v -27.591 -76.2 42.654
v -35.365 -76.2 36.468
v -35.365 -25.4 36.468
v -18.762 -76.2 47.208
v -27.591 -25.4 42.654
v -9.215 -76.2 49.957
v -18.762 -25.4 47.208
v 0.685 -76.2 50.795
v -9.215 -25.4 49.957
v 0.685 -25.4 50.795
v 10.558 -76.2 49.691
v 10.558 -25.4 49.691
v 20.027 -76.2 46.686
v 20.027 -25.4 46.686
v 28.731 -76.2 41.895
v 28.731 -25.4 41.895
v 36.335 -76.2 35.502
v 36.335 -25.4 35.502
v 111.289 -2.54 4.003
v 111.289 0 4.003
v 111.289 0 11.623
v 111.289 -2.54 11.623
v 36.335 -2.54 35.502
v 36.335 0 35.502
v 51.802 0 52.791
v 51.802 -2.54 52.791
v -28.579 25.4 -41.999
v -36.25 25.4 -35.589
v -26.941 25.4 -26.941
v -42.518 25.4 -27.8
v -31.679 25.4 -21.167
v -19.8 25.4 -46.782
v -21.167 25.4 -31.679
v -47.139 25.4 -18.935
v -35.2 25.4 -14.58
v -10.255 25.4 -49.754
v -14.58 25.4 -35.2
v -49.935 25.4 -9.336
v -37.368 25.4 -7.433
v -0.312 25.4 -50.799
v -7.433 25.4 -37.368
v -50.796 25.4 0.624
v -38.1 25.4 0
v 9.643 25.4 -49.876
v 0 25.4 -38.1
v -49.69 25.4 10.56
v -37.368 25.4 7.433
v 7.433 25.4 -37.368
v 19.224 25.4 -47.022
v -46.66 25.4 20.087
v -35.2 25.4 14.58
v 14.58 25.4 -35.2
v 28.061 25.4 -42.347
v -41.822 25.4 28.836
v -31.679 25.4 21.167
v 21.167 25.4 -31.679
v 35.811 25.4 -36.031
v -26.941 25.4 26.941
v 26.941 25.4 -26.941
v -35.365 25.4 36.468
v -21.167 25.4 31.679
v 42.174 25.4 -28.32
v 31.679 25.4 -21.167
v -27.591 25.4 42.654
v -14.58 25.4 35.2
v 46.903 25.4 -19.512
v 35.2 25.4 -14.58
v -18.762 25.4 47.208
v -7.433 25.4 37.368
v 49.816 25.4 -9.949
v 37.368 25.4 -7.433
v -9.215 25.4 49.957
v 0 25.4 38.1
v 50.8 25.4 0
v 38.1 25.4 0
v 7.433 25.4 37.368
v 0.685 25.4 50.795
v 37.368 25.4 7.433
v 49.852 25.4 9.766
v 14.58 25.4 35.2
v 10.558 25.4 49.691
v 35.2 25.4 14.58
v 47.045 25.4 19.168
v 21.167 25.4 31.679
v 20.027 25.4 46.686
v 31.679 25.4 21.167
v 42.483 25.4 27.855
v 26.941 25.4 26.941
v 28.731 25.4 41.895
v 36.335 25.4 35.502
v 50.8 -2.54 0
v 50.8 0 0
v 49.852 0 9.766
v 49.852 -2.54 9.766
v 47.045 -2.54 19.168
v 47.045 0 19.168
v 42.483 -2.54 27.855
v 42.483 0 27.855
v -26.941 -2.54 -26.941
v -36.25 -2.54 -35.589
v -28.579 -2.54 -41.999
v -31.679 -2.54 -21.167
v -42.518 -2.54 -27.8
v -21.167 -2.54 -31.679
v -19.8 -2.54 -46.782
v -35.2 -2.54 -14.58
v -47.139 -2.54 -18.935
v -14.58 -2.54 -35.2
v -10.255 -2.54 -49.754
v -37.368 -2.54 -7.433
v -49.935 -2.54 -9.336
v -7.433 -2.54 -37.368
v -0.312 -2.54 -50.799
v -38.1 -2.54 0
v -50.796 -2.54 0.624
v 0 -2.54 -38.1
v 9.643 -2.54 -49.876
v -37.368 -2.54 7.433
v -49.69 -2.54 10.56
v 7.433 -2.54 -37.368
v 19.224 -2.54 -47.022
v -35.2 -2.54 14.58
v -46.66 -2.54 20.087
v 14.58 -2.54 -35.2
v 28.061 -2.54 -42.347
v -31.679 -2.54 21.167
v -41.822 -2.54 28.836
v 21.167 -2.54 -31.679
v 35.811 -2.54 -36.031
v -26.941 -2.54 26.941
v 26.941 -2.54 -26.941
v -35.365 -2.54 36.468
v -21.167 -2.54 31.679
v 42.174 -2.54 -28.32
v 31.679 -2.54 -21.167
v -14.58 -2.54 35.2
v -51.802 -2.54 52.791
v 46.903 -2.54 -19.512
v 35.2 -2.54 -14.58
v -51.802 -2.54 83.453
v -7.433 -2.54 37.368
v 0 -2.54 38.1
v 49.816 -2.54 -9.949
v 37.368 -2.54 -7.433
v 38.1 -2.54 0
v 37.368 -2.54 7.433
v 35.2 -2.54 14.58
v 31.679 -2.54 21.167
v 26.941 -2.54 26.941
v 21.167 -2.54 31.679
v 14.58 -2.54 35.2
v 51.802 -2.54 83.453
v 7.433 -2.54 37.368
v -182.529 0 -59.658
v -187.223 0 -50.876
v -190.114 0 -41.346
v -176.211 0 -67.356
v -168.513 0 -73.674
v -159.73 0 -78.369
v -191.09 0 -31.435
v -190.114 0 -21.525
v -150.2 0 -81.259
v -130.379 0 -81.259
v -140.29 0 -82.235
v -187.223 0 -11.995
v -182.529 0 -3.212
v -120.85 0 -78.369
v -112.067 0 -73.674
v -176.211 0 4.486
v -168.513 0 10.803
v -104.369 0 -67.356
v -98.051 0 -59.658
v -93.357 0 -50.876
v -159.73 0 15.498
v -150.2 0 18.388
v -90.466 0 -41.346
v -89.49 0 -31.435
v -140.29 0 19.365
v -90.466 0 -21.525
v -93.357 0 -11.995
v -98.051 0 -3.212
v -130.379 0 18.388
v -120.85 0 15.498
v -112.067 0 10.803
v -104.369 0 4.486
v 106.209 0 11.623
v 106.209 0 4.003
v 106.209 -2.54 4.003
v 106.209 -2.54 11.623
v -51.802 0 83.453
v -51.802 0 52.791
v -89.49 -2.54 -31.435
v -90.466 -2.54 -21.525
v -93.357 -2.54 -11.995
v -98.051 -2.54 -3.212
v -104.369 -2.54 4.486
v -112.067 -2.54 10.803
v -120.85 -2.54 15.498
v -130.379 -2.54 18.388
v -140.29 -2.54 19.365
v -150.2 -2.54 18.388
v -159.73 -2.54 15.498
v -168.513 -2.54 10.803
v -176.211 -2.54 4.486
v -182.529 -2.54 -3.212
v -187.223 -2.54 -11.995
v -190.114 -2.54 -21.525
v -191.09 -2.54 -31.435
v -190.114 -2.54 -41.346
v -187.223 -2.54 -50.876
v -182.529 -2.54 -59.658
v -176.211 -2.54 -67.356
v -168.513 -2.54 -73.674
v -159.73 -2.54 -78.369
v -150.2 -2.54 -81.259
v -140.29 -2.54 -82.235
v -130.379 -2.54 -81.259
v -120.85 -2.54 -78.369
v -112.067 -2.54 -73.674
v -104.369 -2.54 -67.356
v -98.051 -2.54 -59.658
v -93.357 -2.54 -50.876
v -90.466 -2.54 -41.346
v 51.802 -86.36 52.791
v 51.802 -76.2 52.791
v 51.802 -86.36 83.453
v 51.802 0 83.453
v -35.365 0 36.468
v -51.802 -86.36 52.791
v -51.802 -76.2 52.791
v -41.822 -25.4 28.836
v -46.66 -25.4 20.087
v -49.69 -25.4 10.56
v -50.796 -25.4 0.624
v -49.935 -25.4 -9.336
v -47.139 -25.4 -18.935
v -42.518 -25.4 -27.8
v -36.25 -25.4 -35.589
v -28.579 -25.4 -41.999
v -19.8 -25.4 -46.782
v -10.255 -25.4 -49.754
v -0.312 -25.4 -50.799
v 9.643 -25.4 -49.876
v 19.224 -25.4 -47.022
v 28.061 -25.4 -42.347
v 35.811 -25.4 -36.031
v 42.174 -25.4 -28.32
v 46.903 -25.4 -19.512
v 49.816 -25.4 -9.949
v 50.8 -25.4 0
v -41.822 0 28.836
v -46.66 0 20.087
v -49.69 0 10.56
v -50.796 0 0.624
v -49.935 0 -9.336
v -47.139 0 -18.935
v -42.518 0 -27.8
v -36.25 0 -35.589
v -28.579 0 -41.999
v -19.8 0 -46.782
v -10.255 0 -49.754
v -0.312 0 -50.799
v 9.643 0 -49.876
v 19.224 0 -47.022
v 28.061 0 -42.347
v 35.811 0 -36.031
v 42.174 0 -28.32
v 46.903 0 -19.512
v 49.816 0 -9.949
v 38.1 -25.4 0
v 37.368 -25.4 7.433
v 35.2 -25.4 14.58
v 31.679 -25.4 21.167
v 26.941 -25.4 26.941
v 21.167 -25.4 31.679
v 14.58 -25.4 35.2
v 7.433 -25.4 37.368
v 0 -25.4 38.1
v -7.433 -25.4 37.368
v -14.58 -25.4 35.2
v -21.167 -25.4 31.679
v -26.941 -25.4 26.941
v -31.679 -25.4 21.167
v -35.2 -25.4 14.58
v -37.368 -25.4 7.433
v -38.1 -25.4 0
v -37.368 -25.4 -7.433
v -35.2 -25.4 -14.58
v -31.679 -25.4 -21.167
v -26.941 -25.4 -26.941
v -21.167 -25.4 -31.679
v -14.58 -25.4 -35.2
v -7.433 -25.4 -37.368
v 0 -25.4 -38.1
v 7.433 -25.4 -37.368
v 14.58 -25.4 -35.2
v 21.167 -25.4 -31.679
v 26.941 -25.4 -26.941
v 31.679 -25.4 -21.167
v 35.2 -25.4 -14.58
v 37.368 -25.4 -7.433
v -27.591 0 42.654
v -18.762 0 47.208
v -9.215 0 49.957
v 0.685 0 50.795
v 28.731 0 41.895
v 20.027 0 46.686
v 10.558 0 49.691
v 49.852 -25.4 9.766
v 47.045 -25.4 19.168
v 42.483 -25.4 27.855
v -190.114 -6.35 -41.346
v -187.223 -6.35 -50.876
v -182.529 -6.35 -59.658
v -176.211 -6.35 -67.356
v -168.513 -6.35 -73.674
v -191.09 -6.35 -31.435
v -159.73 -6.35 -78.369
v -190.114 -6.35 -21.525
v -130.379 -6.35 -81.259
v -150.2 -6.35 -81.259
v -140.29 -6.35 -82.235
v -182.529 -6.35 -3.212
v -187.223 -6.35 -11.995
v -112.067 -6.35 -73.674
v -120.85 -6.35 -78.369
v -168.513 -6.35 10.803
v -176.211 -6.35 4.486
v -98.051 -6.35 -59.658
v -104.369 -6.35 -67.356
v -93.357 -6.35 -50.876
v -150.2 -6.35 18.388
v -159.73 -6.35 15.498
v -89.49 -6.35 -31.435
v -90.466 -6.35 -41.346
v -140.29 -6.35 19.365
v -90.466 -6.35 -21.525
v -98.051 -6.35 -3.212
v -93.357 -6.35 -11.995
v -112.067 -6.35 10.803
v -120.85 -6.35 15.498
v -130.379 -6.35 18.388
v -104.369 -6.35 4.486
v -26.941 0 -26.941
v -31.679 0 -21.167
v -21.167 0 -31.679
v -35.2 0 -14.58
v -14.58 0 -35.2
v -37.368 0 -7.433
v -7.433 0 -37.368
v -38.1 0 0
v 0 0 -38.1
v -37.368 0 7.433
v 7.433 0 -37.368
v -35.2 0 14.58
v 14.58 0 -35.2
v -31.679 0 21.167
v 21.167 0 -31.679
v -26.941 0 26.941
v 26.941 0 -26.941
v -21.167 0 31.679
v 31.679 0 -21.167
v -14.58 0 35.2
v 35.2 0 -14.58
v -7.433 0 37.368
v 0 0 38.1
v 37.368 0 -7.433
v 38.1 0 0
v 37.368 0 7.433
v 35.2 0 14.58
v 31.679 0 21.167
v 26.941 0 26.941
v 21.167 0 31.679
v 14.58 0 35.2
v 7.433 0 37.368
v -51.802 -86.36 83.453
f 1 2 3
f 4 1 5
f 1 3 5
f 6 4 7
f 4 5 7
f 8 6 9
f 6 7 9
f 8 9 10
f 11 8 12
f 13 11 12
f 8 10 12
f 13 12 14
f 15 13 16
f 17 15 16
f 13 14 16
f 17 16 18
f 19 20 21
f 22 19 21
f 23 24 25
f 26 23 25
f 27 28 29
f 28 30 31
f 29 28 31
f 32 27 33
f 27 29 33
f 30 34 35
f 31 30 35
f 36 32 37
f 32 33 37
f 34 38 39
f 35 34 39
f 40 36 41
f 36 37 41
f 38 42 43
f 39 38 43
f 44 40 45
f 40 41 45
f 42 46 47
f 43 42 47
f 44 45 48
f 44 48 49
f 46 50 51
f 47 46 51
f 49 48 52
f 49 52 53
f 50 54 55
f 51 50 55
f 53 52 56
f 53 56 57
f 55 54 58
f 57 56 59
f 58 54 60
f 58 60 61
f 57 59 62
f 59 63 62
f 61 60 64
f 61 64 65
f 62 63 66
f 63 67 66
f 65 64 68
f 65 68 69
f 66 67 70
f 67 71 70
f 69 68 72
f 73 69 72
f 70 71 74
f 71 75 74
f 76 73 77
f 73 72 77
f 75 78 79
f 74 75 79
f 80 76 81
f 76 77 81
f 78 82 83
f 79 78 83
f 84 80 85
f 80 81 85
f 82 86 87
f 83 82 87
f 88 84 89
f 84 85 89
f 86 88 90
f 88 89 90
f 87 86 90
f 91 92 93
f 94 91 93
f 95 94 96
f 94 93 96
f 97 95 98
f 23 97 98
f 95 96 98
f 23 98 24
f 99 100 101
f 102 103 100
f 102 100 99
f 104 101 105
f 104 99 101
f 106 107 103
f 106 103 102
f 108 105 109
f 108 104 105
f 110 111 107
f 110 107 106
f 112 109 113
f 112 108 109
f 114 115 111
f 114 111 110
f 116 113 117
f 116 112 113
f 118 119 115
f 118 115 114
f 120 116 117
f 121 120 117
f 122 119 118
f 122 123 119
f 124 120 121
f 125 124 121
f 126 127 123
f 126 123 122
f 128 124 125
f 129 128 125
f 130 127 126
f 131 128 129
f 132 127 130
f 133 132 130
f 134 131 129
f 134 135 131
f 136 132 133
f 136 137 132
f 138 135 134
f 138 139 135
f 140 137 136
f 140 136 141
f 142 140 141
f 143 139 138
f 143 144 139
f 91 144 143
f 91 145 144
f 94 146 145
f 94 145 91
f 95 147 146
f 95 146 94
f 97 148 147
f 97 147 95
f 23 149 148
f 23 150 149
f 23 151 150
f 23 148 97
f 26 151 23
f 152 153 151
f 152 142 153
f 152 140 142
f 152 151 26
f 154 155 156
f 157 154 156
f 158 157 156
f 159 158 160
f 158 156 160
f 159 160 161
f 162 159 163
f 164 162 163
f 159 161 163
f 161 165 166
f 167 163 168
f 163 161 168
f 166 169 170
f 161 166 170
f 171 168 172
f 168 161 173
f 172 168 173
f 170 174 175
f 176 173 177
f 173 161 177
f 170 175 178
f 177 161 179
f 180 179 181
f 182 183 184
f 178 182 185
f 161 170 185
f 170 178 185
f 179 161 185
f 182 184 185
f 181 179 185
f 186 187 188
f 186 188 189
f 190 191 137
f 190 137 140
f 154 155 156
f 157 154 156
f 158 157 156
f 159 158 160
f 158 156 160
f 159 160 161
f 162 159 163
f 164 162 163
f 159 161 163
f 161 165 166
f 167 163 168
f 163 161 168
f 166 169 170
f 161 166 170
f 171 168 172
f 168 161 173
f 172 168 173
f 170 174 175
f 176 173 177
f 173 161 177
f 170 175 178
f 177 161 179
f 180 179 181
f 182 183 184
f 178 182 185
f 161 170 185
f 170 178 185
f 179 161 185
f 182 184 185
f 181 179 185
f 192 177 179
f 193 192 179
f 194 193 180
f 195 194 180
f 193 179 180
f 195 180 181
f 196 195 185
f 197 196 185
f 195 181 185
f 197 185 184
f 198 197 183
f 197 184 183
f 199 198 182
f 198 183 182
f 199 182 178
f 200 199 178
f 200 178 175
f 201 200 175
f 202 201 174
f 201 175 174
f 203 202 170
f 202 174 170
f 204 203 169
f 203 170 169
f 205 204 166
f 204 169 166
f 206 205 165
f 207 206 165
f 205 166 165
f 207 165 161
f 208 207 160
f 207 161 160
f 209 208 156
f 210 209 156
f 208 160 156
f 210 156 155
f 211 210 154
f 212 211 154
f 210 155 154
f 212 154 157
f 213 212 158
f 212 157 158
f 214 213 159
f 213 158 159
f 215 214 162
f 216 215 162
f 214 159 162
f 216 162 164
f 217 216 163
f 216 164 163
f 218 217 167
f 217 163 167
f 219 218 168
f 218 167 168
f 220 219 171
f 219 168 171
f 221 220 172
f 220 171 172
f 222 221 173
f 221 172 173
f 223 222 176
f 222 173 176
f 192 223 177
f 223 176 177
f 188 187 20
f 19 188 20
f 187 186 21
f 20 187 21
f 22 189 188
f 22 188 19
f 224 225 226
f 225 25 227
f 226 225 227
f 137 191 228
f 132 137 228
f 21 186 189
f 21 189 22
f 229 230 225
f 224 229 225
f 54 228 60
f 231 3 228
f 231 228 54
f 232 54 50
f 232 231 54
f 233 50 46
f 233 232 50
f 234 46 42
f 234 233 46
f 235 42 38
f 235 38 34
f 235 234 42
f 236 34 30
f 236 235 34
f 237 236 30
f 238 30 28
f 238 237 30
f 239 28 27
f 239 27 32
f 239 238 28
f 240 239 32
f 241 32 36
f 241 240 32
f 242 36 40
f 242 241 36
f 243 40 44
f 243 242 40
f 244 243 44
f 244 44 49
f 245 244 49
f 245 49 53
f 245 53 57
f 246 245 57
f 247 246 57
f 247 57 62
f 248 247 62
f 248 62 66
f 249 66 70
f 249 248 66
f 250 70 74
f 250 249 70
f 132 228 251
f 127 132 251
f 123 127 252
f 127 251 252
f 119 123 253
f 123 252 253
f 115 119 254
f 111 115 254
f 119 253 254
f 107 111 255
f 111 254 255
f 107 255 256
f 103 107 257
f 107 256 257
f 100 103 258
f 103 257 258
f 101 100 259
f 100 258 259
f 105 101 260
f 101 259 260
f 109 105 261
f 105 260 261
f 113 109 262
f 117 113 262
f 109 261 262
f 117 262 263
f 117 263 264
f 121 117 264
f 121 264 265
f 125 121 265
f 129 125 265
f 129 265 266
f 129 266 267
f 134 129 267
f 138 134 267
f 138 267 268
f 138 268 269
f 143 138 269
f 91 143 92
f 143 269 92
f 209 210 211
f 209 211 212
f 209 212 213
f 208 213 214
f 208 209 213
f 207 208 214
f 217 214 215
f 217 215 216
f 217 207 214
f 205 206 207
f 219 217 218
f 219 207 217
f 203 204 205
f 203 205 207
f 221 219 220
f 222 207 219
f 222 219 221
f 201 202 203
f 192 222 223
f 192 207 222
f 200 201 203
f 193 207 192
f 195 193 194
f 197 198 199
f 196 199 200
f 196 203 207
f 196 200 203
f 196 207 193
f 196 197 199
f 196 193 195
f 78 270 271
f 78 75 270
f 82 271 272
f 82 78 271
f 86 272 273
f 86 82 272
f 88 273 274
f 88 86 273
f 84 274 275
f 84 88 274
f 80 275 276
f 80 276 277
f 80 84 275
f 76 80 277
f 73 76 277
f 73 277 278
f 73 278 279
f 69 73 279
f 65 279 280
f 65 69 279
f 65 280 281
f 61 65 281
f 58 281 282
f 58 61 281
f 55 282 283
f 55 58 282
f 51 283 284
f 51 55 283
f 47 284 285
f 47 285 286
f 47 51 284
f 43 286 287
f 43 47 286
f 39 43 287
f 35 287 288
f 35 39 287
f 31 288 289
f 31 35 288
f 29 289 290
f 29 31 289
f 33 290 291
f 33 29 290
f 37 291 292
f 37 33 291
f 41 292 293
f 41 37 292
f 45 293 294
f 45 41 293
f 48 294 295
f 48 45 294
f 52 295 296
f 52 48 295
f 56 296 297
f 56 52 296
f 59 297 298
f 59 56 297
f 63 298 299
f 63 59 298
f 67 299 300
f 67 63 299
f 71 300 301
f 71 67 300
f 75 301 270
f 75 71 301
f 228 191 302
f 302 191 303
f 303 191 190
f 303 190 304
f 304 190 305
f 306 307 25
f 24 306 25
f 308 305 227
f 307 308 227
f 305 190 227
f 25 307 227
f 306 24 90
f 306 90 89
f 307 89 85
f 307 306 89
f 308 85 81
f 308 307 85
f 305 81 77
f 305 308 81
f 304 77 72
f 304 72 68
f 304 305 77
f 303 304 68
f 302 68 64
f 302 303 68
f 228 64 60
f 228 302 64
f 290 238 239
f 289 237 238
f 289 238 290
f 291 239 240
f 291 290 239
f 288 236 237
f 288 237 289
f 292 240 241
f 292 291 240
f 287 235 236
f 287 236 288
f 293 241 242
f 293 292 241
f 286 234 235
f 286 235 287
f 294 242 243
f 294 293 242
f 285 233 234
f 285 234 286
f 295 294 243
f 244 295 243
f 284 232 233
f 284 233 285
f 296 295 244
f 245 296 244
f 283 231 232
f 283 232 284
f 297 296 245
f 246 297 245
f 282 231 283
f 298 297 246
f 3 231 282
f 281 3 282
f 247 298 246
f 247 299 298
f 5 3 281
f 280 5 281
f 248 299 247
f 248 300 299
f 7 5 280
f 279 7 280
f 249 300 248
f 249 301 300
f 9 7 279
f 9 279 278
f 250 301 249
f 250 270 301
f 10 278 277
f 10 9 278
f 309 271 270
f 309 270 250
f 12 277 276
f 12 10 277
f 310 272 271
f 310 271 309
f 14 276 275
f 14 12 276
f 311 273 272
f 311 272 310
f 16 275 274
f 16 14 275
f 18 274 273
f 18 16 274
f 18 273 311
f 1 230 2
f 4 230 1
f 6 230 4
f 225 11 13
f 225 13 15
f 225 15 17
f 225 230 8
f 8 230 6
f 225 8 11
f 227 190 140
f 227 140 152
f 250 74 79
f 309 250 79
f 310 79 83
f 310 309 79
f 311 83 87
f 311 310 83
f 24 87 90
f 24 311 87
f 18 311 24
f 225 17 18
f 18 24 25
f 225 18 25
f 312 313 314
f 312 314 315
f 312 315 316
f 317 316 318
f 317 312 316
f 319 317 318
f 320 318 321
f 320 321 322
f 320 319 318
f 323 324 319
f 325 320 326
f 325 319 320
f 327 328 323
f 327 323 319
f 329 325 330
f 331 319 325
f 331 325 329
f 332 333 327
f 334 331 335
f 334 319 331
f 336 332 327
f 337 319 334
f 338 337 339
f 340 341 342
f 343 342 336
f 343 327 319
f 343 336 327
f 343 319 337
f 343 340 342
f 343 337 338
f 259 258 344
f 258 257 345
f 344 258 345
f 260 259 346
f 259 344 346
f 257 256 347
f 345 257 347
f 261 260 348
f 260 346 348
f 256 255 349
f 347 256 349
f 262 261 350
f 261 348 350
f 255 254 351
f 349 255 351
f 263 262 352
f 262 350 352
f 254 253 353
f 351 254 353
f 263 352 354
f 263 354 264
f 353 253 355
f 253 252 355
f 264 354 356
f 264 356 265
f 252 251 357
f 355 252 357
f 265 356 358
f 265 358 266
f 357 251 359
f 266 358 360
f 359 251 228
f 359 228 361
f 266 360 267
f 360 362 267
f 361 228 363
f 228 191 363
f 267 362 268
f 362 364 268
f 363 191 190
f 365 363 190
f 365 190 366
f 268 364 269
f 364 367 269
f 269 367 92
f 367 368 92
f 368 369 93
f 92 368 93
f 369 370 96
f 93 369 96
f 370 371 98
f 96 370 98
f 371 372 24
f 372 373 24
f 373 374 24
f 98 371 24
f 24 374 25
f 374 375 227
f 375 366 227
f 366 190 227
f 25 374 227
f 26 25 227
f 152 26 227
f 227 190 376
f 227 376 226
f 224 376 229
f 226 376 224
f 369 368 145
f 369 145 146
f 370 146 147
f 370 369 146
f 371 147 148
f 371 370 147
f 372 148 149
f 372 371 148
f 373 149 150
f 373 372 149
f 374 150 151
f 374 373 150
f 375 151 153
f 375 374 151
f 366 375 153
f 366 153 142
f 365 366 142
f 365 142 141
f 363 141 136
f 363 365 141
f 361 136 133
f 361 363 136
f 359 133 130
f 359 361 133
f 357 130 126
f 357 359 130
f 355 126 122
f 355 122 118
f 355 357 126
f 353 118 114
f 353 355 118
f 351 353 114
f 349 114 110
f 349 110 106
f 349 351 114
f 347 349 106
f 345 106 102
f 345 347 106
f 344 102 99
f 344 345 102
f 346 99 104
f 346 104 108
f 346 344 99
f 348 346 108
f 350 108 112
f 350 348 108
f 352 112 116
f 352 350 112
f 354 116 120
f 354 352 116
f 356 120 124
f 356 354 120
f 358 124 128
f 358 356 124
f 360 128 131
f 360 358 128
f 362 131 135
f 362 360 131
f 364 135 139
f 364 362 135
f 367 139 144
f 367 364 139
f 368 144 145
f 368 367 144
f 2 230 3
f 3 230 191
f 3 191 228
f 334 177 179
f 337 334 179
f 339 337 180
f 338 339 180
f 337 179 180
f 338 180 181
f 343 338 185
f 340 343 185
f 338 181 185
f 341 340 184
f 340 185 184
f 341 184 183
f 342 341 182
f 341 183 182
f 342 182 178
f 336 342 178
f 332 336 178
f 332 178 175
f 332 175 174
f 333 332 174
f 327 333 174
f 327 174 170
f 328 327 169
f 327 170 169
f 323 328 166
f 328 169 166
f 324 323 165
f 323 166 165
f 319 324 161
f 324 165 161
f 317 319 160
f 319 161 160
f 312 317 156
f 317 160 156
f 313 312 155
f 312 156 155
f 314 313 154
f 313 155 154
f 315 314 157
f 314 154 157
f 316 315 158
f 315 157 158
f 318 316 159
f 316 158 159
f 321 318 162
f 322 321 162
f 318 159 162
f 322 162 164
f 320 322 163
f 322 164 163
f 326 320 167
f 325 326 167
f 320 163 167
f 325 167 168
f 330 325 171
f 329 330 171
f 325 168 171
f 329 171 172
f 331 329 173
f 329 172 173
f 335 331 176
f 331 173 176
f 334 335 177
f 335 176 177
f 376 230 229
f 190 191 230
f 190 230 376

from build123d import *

# Parameters (mm, degrees)
F0_R     = 38.1
F1_DEPTH = 25.4
F2_DEPTH = 76.2
F0_W     = 103.60305
F0_H     = 30.662268
F3_DEPTH = 86.36
F0_R_2   = 50.8
F4_DEPTH = 6.35
F0_W_2   = 5.08
F0_H_2   = 7.62
F5_DEPTH = 2.54


with BuildPart() as f1:
    # F0 (on Front) → F1 (new body, symmetric)
    with BuildSketch(Plane.XZ):
        with BuildLine():
            ThreePointArc((-35.365184, 36.468394), (-19.800109, -46.782429), (50.8, 0))
            ThreePointArc((50.8, 0), (47.045013, 19.167857), (36.335168, 35.50205))
            ThreePointArc((36.335168, 35.50205), (0.684596, 50.795387), (-35.365184, 36.468394))
        make_face()
        Circle(F0_R, mode=Mode.SUBTRACT)
    extrude(amount=F1_DEPTH, both=True)

    # F0 (on Front) → F2 (join)
    with BuildSketch(Plane.XZ):
        with BuildLine():
            ThreePointArc((-35.365184, 36.468394), (0.684596, 50.795387), (36.335168, 35.50205))
            Line((36.335168, 35.50205), (51.801525, 52.790806))
            Line((51.801525, 52.790806), (-51.801525, 52.790806))
            Line((-51.801525, 52.790806), (-35.365184, 36.468394))
        make_face()
    extrude(amount=F2_DEPTH)

    # F0 (on Front) → F3 (join)
    with BuildSketch(Plane.XZ):
        with Locations((0, 68.12194)):
            Rectangle(F0_W, F0_H)
    extrude(amount=F3_DEPTH)


with BuildPart() as f4:
    # F0 (on Front) → F4 (new body)
    with BuildSketch(Plane.XZ):
        with Locations((-140.289858, -31.435423)):
            Circle(F0_R_2)
    extrude(amount=F4_DEPTH)


with BuildPart() as f5:
    # F0 (on Front) → F5 (new body)
    with BuildSketch(Plane.XZ):
        with BuildLine():
            ThreePointArc((-35.365184, 36.468394), (-19.800109, -46.782429), (50.8, 0))
            ThreePointArc((50.8, 0), (47.045013, 19.167857), (36.335168, 35.50205))
            ThreePointArc((36.335168, 35.50205), (0.684596, 50.795387), (-35.365184, 36.468394))
        make_face()
        Circle(F0_R, mode=Mode.SUBTRACT)
        with BuildLine():
            ThreePointArc((-35.365184, 36.468394), (0.684596, 50.795387), (36.335168, 35.50205))
            Line((36.335168, 35.50205), (51.801525, 52.790806))
            Line((51.801525, 52.790806), (-51.801525, 52.790806))
            Line((-51.801525, 52.790806), (-35.365184, 36.468394))
        make_face()
        with Locations((0, 68.12194)):
            Rectangle(F0_W, F0_H)
        with Locations((-140.289858, -31.435423)):
            Circle(F0_R_2)
        with Locations((108.748518, 7.812504)):
            Rectangle(F0_W_2, F0_H_2)
    extrude(amount=F5_DEPTH)


solid = Compound([f1.part, f4.part, f5.part])
